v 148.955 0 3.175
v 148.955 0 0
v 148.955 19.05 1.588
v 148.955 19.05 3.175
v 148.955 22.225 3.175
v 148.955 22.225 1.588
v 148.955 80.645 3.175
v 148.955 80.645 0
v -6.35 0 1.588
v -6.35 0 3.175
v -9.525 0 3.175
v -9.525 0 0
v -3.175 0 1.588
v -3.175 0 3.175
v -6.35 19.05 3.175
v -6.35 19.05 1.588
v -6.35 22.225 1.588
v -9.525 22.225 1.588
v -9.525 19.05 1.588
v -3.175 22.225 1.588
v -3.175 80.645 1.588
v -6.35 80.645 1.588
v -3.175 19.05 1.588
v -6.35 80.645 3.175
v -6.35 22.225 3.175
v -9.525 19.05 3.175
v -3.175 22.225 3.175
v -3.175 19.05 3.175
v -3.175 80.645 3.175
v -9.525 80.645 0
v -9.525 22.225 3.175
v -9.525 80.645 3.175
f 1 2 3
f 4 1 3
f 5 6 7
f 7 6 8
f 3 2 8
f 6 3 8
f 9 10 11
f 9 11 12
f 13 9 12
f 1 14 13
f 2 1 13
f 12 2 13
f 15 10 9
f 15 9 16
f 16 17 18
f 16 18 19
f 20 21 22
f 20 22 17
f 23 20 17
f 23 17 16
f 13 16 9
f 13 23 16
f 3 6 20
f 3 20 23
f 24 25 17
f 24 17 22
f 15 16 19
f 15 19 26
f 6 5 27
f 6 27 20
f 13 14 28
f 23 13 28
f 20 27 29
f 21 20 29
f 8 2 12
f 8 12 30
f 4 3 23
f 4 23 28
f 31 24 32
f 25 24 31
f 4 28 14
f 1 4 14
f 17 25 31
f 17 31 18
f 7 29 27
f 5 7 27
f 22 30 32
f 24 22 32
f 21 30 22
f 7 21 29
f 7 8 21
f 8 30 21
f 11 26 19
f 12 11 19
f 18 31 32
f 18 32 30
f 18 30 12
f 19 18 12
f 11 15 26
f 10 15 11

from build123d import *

# Parameters (mm, degrees)
BOSS_EXTRUDE1_DEPTH = 3.175
SKETCH2_W           = 1.5875
SKETCH2_H           = 3.175
CUT_EXTRUDE1_DEPTH  = 170.414546822
BOSS_EXTRUDE2_DEPTH = 9.525
SKETCH5_W           = 3.175
SKETCH5_H           = 80.645
CUT_EXTRUDE2_DEPTH  = 1.5875


with BuildPart() as part:
    # Sketch1 → Boss-Extrude1 (new body)
    with BuildSketch(Plane.XY):
        Polygon((89.265, 0), (148.955, 0), (148.955, 80.645), (0, 80.645), (0, 0), align=None)
    extrude(amount=BOSS_EXTRUDE1_DEPTH)

    # Sketch2 → Cut-Extrude1 (cut, through all)
    with BuildSketch(Plane(origin=(148.955, 0, 0), x_dir=(0, 0, -1), z_dir=(1, 0, 0))):
        with Locations((-2.38125, 20.6375)):
            Rectangle(SKETCH2_W, SKETCH2_H)
    extrude(amount=-CUT_EXTRUDE1_DEPTH, mode=Mode.SUBTRACT)

    # Sketch4 → Boss-Extrude2 (add)
    with BuildSketch(Plane.ZY):
        Polygon((3.175, 19.05), (3.175, 0), (0, 0), (0, 80.645), (3.175, 80.645), (3.175, 22.225), (1.5875, 22.225), (1.5875, 19.05), align=None)
    extrude(amount=BOSS_EXTRUDE2_DEPTH)

    # Sketch5 → Cut-Extrude2 (cut)
    with BuildSketch(Plane.XY.offset(3.175)):
        with Locations((-4.7625, 40.3225)):
            Rectangle(SKETCH5_W, SKETCH5_H)
    extrude(amount=-CUT_EXTRUDE2_DEPTH, mode=Mode.SUBTRACT)


solid = part.part
